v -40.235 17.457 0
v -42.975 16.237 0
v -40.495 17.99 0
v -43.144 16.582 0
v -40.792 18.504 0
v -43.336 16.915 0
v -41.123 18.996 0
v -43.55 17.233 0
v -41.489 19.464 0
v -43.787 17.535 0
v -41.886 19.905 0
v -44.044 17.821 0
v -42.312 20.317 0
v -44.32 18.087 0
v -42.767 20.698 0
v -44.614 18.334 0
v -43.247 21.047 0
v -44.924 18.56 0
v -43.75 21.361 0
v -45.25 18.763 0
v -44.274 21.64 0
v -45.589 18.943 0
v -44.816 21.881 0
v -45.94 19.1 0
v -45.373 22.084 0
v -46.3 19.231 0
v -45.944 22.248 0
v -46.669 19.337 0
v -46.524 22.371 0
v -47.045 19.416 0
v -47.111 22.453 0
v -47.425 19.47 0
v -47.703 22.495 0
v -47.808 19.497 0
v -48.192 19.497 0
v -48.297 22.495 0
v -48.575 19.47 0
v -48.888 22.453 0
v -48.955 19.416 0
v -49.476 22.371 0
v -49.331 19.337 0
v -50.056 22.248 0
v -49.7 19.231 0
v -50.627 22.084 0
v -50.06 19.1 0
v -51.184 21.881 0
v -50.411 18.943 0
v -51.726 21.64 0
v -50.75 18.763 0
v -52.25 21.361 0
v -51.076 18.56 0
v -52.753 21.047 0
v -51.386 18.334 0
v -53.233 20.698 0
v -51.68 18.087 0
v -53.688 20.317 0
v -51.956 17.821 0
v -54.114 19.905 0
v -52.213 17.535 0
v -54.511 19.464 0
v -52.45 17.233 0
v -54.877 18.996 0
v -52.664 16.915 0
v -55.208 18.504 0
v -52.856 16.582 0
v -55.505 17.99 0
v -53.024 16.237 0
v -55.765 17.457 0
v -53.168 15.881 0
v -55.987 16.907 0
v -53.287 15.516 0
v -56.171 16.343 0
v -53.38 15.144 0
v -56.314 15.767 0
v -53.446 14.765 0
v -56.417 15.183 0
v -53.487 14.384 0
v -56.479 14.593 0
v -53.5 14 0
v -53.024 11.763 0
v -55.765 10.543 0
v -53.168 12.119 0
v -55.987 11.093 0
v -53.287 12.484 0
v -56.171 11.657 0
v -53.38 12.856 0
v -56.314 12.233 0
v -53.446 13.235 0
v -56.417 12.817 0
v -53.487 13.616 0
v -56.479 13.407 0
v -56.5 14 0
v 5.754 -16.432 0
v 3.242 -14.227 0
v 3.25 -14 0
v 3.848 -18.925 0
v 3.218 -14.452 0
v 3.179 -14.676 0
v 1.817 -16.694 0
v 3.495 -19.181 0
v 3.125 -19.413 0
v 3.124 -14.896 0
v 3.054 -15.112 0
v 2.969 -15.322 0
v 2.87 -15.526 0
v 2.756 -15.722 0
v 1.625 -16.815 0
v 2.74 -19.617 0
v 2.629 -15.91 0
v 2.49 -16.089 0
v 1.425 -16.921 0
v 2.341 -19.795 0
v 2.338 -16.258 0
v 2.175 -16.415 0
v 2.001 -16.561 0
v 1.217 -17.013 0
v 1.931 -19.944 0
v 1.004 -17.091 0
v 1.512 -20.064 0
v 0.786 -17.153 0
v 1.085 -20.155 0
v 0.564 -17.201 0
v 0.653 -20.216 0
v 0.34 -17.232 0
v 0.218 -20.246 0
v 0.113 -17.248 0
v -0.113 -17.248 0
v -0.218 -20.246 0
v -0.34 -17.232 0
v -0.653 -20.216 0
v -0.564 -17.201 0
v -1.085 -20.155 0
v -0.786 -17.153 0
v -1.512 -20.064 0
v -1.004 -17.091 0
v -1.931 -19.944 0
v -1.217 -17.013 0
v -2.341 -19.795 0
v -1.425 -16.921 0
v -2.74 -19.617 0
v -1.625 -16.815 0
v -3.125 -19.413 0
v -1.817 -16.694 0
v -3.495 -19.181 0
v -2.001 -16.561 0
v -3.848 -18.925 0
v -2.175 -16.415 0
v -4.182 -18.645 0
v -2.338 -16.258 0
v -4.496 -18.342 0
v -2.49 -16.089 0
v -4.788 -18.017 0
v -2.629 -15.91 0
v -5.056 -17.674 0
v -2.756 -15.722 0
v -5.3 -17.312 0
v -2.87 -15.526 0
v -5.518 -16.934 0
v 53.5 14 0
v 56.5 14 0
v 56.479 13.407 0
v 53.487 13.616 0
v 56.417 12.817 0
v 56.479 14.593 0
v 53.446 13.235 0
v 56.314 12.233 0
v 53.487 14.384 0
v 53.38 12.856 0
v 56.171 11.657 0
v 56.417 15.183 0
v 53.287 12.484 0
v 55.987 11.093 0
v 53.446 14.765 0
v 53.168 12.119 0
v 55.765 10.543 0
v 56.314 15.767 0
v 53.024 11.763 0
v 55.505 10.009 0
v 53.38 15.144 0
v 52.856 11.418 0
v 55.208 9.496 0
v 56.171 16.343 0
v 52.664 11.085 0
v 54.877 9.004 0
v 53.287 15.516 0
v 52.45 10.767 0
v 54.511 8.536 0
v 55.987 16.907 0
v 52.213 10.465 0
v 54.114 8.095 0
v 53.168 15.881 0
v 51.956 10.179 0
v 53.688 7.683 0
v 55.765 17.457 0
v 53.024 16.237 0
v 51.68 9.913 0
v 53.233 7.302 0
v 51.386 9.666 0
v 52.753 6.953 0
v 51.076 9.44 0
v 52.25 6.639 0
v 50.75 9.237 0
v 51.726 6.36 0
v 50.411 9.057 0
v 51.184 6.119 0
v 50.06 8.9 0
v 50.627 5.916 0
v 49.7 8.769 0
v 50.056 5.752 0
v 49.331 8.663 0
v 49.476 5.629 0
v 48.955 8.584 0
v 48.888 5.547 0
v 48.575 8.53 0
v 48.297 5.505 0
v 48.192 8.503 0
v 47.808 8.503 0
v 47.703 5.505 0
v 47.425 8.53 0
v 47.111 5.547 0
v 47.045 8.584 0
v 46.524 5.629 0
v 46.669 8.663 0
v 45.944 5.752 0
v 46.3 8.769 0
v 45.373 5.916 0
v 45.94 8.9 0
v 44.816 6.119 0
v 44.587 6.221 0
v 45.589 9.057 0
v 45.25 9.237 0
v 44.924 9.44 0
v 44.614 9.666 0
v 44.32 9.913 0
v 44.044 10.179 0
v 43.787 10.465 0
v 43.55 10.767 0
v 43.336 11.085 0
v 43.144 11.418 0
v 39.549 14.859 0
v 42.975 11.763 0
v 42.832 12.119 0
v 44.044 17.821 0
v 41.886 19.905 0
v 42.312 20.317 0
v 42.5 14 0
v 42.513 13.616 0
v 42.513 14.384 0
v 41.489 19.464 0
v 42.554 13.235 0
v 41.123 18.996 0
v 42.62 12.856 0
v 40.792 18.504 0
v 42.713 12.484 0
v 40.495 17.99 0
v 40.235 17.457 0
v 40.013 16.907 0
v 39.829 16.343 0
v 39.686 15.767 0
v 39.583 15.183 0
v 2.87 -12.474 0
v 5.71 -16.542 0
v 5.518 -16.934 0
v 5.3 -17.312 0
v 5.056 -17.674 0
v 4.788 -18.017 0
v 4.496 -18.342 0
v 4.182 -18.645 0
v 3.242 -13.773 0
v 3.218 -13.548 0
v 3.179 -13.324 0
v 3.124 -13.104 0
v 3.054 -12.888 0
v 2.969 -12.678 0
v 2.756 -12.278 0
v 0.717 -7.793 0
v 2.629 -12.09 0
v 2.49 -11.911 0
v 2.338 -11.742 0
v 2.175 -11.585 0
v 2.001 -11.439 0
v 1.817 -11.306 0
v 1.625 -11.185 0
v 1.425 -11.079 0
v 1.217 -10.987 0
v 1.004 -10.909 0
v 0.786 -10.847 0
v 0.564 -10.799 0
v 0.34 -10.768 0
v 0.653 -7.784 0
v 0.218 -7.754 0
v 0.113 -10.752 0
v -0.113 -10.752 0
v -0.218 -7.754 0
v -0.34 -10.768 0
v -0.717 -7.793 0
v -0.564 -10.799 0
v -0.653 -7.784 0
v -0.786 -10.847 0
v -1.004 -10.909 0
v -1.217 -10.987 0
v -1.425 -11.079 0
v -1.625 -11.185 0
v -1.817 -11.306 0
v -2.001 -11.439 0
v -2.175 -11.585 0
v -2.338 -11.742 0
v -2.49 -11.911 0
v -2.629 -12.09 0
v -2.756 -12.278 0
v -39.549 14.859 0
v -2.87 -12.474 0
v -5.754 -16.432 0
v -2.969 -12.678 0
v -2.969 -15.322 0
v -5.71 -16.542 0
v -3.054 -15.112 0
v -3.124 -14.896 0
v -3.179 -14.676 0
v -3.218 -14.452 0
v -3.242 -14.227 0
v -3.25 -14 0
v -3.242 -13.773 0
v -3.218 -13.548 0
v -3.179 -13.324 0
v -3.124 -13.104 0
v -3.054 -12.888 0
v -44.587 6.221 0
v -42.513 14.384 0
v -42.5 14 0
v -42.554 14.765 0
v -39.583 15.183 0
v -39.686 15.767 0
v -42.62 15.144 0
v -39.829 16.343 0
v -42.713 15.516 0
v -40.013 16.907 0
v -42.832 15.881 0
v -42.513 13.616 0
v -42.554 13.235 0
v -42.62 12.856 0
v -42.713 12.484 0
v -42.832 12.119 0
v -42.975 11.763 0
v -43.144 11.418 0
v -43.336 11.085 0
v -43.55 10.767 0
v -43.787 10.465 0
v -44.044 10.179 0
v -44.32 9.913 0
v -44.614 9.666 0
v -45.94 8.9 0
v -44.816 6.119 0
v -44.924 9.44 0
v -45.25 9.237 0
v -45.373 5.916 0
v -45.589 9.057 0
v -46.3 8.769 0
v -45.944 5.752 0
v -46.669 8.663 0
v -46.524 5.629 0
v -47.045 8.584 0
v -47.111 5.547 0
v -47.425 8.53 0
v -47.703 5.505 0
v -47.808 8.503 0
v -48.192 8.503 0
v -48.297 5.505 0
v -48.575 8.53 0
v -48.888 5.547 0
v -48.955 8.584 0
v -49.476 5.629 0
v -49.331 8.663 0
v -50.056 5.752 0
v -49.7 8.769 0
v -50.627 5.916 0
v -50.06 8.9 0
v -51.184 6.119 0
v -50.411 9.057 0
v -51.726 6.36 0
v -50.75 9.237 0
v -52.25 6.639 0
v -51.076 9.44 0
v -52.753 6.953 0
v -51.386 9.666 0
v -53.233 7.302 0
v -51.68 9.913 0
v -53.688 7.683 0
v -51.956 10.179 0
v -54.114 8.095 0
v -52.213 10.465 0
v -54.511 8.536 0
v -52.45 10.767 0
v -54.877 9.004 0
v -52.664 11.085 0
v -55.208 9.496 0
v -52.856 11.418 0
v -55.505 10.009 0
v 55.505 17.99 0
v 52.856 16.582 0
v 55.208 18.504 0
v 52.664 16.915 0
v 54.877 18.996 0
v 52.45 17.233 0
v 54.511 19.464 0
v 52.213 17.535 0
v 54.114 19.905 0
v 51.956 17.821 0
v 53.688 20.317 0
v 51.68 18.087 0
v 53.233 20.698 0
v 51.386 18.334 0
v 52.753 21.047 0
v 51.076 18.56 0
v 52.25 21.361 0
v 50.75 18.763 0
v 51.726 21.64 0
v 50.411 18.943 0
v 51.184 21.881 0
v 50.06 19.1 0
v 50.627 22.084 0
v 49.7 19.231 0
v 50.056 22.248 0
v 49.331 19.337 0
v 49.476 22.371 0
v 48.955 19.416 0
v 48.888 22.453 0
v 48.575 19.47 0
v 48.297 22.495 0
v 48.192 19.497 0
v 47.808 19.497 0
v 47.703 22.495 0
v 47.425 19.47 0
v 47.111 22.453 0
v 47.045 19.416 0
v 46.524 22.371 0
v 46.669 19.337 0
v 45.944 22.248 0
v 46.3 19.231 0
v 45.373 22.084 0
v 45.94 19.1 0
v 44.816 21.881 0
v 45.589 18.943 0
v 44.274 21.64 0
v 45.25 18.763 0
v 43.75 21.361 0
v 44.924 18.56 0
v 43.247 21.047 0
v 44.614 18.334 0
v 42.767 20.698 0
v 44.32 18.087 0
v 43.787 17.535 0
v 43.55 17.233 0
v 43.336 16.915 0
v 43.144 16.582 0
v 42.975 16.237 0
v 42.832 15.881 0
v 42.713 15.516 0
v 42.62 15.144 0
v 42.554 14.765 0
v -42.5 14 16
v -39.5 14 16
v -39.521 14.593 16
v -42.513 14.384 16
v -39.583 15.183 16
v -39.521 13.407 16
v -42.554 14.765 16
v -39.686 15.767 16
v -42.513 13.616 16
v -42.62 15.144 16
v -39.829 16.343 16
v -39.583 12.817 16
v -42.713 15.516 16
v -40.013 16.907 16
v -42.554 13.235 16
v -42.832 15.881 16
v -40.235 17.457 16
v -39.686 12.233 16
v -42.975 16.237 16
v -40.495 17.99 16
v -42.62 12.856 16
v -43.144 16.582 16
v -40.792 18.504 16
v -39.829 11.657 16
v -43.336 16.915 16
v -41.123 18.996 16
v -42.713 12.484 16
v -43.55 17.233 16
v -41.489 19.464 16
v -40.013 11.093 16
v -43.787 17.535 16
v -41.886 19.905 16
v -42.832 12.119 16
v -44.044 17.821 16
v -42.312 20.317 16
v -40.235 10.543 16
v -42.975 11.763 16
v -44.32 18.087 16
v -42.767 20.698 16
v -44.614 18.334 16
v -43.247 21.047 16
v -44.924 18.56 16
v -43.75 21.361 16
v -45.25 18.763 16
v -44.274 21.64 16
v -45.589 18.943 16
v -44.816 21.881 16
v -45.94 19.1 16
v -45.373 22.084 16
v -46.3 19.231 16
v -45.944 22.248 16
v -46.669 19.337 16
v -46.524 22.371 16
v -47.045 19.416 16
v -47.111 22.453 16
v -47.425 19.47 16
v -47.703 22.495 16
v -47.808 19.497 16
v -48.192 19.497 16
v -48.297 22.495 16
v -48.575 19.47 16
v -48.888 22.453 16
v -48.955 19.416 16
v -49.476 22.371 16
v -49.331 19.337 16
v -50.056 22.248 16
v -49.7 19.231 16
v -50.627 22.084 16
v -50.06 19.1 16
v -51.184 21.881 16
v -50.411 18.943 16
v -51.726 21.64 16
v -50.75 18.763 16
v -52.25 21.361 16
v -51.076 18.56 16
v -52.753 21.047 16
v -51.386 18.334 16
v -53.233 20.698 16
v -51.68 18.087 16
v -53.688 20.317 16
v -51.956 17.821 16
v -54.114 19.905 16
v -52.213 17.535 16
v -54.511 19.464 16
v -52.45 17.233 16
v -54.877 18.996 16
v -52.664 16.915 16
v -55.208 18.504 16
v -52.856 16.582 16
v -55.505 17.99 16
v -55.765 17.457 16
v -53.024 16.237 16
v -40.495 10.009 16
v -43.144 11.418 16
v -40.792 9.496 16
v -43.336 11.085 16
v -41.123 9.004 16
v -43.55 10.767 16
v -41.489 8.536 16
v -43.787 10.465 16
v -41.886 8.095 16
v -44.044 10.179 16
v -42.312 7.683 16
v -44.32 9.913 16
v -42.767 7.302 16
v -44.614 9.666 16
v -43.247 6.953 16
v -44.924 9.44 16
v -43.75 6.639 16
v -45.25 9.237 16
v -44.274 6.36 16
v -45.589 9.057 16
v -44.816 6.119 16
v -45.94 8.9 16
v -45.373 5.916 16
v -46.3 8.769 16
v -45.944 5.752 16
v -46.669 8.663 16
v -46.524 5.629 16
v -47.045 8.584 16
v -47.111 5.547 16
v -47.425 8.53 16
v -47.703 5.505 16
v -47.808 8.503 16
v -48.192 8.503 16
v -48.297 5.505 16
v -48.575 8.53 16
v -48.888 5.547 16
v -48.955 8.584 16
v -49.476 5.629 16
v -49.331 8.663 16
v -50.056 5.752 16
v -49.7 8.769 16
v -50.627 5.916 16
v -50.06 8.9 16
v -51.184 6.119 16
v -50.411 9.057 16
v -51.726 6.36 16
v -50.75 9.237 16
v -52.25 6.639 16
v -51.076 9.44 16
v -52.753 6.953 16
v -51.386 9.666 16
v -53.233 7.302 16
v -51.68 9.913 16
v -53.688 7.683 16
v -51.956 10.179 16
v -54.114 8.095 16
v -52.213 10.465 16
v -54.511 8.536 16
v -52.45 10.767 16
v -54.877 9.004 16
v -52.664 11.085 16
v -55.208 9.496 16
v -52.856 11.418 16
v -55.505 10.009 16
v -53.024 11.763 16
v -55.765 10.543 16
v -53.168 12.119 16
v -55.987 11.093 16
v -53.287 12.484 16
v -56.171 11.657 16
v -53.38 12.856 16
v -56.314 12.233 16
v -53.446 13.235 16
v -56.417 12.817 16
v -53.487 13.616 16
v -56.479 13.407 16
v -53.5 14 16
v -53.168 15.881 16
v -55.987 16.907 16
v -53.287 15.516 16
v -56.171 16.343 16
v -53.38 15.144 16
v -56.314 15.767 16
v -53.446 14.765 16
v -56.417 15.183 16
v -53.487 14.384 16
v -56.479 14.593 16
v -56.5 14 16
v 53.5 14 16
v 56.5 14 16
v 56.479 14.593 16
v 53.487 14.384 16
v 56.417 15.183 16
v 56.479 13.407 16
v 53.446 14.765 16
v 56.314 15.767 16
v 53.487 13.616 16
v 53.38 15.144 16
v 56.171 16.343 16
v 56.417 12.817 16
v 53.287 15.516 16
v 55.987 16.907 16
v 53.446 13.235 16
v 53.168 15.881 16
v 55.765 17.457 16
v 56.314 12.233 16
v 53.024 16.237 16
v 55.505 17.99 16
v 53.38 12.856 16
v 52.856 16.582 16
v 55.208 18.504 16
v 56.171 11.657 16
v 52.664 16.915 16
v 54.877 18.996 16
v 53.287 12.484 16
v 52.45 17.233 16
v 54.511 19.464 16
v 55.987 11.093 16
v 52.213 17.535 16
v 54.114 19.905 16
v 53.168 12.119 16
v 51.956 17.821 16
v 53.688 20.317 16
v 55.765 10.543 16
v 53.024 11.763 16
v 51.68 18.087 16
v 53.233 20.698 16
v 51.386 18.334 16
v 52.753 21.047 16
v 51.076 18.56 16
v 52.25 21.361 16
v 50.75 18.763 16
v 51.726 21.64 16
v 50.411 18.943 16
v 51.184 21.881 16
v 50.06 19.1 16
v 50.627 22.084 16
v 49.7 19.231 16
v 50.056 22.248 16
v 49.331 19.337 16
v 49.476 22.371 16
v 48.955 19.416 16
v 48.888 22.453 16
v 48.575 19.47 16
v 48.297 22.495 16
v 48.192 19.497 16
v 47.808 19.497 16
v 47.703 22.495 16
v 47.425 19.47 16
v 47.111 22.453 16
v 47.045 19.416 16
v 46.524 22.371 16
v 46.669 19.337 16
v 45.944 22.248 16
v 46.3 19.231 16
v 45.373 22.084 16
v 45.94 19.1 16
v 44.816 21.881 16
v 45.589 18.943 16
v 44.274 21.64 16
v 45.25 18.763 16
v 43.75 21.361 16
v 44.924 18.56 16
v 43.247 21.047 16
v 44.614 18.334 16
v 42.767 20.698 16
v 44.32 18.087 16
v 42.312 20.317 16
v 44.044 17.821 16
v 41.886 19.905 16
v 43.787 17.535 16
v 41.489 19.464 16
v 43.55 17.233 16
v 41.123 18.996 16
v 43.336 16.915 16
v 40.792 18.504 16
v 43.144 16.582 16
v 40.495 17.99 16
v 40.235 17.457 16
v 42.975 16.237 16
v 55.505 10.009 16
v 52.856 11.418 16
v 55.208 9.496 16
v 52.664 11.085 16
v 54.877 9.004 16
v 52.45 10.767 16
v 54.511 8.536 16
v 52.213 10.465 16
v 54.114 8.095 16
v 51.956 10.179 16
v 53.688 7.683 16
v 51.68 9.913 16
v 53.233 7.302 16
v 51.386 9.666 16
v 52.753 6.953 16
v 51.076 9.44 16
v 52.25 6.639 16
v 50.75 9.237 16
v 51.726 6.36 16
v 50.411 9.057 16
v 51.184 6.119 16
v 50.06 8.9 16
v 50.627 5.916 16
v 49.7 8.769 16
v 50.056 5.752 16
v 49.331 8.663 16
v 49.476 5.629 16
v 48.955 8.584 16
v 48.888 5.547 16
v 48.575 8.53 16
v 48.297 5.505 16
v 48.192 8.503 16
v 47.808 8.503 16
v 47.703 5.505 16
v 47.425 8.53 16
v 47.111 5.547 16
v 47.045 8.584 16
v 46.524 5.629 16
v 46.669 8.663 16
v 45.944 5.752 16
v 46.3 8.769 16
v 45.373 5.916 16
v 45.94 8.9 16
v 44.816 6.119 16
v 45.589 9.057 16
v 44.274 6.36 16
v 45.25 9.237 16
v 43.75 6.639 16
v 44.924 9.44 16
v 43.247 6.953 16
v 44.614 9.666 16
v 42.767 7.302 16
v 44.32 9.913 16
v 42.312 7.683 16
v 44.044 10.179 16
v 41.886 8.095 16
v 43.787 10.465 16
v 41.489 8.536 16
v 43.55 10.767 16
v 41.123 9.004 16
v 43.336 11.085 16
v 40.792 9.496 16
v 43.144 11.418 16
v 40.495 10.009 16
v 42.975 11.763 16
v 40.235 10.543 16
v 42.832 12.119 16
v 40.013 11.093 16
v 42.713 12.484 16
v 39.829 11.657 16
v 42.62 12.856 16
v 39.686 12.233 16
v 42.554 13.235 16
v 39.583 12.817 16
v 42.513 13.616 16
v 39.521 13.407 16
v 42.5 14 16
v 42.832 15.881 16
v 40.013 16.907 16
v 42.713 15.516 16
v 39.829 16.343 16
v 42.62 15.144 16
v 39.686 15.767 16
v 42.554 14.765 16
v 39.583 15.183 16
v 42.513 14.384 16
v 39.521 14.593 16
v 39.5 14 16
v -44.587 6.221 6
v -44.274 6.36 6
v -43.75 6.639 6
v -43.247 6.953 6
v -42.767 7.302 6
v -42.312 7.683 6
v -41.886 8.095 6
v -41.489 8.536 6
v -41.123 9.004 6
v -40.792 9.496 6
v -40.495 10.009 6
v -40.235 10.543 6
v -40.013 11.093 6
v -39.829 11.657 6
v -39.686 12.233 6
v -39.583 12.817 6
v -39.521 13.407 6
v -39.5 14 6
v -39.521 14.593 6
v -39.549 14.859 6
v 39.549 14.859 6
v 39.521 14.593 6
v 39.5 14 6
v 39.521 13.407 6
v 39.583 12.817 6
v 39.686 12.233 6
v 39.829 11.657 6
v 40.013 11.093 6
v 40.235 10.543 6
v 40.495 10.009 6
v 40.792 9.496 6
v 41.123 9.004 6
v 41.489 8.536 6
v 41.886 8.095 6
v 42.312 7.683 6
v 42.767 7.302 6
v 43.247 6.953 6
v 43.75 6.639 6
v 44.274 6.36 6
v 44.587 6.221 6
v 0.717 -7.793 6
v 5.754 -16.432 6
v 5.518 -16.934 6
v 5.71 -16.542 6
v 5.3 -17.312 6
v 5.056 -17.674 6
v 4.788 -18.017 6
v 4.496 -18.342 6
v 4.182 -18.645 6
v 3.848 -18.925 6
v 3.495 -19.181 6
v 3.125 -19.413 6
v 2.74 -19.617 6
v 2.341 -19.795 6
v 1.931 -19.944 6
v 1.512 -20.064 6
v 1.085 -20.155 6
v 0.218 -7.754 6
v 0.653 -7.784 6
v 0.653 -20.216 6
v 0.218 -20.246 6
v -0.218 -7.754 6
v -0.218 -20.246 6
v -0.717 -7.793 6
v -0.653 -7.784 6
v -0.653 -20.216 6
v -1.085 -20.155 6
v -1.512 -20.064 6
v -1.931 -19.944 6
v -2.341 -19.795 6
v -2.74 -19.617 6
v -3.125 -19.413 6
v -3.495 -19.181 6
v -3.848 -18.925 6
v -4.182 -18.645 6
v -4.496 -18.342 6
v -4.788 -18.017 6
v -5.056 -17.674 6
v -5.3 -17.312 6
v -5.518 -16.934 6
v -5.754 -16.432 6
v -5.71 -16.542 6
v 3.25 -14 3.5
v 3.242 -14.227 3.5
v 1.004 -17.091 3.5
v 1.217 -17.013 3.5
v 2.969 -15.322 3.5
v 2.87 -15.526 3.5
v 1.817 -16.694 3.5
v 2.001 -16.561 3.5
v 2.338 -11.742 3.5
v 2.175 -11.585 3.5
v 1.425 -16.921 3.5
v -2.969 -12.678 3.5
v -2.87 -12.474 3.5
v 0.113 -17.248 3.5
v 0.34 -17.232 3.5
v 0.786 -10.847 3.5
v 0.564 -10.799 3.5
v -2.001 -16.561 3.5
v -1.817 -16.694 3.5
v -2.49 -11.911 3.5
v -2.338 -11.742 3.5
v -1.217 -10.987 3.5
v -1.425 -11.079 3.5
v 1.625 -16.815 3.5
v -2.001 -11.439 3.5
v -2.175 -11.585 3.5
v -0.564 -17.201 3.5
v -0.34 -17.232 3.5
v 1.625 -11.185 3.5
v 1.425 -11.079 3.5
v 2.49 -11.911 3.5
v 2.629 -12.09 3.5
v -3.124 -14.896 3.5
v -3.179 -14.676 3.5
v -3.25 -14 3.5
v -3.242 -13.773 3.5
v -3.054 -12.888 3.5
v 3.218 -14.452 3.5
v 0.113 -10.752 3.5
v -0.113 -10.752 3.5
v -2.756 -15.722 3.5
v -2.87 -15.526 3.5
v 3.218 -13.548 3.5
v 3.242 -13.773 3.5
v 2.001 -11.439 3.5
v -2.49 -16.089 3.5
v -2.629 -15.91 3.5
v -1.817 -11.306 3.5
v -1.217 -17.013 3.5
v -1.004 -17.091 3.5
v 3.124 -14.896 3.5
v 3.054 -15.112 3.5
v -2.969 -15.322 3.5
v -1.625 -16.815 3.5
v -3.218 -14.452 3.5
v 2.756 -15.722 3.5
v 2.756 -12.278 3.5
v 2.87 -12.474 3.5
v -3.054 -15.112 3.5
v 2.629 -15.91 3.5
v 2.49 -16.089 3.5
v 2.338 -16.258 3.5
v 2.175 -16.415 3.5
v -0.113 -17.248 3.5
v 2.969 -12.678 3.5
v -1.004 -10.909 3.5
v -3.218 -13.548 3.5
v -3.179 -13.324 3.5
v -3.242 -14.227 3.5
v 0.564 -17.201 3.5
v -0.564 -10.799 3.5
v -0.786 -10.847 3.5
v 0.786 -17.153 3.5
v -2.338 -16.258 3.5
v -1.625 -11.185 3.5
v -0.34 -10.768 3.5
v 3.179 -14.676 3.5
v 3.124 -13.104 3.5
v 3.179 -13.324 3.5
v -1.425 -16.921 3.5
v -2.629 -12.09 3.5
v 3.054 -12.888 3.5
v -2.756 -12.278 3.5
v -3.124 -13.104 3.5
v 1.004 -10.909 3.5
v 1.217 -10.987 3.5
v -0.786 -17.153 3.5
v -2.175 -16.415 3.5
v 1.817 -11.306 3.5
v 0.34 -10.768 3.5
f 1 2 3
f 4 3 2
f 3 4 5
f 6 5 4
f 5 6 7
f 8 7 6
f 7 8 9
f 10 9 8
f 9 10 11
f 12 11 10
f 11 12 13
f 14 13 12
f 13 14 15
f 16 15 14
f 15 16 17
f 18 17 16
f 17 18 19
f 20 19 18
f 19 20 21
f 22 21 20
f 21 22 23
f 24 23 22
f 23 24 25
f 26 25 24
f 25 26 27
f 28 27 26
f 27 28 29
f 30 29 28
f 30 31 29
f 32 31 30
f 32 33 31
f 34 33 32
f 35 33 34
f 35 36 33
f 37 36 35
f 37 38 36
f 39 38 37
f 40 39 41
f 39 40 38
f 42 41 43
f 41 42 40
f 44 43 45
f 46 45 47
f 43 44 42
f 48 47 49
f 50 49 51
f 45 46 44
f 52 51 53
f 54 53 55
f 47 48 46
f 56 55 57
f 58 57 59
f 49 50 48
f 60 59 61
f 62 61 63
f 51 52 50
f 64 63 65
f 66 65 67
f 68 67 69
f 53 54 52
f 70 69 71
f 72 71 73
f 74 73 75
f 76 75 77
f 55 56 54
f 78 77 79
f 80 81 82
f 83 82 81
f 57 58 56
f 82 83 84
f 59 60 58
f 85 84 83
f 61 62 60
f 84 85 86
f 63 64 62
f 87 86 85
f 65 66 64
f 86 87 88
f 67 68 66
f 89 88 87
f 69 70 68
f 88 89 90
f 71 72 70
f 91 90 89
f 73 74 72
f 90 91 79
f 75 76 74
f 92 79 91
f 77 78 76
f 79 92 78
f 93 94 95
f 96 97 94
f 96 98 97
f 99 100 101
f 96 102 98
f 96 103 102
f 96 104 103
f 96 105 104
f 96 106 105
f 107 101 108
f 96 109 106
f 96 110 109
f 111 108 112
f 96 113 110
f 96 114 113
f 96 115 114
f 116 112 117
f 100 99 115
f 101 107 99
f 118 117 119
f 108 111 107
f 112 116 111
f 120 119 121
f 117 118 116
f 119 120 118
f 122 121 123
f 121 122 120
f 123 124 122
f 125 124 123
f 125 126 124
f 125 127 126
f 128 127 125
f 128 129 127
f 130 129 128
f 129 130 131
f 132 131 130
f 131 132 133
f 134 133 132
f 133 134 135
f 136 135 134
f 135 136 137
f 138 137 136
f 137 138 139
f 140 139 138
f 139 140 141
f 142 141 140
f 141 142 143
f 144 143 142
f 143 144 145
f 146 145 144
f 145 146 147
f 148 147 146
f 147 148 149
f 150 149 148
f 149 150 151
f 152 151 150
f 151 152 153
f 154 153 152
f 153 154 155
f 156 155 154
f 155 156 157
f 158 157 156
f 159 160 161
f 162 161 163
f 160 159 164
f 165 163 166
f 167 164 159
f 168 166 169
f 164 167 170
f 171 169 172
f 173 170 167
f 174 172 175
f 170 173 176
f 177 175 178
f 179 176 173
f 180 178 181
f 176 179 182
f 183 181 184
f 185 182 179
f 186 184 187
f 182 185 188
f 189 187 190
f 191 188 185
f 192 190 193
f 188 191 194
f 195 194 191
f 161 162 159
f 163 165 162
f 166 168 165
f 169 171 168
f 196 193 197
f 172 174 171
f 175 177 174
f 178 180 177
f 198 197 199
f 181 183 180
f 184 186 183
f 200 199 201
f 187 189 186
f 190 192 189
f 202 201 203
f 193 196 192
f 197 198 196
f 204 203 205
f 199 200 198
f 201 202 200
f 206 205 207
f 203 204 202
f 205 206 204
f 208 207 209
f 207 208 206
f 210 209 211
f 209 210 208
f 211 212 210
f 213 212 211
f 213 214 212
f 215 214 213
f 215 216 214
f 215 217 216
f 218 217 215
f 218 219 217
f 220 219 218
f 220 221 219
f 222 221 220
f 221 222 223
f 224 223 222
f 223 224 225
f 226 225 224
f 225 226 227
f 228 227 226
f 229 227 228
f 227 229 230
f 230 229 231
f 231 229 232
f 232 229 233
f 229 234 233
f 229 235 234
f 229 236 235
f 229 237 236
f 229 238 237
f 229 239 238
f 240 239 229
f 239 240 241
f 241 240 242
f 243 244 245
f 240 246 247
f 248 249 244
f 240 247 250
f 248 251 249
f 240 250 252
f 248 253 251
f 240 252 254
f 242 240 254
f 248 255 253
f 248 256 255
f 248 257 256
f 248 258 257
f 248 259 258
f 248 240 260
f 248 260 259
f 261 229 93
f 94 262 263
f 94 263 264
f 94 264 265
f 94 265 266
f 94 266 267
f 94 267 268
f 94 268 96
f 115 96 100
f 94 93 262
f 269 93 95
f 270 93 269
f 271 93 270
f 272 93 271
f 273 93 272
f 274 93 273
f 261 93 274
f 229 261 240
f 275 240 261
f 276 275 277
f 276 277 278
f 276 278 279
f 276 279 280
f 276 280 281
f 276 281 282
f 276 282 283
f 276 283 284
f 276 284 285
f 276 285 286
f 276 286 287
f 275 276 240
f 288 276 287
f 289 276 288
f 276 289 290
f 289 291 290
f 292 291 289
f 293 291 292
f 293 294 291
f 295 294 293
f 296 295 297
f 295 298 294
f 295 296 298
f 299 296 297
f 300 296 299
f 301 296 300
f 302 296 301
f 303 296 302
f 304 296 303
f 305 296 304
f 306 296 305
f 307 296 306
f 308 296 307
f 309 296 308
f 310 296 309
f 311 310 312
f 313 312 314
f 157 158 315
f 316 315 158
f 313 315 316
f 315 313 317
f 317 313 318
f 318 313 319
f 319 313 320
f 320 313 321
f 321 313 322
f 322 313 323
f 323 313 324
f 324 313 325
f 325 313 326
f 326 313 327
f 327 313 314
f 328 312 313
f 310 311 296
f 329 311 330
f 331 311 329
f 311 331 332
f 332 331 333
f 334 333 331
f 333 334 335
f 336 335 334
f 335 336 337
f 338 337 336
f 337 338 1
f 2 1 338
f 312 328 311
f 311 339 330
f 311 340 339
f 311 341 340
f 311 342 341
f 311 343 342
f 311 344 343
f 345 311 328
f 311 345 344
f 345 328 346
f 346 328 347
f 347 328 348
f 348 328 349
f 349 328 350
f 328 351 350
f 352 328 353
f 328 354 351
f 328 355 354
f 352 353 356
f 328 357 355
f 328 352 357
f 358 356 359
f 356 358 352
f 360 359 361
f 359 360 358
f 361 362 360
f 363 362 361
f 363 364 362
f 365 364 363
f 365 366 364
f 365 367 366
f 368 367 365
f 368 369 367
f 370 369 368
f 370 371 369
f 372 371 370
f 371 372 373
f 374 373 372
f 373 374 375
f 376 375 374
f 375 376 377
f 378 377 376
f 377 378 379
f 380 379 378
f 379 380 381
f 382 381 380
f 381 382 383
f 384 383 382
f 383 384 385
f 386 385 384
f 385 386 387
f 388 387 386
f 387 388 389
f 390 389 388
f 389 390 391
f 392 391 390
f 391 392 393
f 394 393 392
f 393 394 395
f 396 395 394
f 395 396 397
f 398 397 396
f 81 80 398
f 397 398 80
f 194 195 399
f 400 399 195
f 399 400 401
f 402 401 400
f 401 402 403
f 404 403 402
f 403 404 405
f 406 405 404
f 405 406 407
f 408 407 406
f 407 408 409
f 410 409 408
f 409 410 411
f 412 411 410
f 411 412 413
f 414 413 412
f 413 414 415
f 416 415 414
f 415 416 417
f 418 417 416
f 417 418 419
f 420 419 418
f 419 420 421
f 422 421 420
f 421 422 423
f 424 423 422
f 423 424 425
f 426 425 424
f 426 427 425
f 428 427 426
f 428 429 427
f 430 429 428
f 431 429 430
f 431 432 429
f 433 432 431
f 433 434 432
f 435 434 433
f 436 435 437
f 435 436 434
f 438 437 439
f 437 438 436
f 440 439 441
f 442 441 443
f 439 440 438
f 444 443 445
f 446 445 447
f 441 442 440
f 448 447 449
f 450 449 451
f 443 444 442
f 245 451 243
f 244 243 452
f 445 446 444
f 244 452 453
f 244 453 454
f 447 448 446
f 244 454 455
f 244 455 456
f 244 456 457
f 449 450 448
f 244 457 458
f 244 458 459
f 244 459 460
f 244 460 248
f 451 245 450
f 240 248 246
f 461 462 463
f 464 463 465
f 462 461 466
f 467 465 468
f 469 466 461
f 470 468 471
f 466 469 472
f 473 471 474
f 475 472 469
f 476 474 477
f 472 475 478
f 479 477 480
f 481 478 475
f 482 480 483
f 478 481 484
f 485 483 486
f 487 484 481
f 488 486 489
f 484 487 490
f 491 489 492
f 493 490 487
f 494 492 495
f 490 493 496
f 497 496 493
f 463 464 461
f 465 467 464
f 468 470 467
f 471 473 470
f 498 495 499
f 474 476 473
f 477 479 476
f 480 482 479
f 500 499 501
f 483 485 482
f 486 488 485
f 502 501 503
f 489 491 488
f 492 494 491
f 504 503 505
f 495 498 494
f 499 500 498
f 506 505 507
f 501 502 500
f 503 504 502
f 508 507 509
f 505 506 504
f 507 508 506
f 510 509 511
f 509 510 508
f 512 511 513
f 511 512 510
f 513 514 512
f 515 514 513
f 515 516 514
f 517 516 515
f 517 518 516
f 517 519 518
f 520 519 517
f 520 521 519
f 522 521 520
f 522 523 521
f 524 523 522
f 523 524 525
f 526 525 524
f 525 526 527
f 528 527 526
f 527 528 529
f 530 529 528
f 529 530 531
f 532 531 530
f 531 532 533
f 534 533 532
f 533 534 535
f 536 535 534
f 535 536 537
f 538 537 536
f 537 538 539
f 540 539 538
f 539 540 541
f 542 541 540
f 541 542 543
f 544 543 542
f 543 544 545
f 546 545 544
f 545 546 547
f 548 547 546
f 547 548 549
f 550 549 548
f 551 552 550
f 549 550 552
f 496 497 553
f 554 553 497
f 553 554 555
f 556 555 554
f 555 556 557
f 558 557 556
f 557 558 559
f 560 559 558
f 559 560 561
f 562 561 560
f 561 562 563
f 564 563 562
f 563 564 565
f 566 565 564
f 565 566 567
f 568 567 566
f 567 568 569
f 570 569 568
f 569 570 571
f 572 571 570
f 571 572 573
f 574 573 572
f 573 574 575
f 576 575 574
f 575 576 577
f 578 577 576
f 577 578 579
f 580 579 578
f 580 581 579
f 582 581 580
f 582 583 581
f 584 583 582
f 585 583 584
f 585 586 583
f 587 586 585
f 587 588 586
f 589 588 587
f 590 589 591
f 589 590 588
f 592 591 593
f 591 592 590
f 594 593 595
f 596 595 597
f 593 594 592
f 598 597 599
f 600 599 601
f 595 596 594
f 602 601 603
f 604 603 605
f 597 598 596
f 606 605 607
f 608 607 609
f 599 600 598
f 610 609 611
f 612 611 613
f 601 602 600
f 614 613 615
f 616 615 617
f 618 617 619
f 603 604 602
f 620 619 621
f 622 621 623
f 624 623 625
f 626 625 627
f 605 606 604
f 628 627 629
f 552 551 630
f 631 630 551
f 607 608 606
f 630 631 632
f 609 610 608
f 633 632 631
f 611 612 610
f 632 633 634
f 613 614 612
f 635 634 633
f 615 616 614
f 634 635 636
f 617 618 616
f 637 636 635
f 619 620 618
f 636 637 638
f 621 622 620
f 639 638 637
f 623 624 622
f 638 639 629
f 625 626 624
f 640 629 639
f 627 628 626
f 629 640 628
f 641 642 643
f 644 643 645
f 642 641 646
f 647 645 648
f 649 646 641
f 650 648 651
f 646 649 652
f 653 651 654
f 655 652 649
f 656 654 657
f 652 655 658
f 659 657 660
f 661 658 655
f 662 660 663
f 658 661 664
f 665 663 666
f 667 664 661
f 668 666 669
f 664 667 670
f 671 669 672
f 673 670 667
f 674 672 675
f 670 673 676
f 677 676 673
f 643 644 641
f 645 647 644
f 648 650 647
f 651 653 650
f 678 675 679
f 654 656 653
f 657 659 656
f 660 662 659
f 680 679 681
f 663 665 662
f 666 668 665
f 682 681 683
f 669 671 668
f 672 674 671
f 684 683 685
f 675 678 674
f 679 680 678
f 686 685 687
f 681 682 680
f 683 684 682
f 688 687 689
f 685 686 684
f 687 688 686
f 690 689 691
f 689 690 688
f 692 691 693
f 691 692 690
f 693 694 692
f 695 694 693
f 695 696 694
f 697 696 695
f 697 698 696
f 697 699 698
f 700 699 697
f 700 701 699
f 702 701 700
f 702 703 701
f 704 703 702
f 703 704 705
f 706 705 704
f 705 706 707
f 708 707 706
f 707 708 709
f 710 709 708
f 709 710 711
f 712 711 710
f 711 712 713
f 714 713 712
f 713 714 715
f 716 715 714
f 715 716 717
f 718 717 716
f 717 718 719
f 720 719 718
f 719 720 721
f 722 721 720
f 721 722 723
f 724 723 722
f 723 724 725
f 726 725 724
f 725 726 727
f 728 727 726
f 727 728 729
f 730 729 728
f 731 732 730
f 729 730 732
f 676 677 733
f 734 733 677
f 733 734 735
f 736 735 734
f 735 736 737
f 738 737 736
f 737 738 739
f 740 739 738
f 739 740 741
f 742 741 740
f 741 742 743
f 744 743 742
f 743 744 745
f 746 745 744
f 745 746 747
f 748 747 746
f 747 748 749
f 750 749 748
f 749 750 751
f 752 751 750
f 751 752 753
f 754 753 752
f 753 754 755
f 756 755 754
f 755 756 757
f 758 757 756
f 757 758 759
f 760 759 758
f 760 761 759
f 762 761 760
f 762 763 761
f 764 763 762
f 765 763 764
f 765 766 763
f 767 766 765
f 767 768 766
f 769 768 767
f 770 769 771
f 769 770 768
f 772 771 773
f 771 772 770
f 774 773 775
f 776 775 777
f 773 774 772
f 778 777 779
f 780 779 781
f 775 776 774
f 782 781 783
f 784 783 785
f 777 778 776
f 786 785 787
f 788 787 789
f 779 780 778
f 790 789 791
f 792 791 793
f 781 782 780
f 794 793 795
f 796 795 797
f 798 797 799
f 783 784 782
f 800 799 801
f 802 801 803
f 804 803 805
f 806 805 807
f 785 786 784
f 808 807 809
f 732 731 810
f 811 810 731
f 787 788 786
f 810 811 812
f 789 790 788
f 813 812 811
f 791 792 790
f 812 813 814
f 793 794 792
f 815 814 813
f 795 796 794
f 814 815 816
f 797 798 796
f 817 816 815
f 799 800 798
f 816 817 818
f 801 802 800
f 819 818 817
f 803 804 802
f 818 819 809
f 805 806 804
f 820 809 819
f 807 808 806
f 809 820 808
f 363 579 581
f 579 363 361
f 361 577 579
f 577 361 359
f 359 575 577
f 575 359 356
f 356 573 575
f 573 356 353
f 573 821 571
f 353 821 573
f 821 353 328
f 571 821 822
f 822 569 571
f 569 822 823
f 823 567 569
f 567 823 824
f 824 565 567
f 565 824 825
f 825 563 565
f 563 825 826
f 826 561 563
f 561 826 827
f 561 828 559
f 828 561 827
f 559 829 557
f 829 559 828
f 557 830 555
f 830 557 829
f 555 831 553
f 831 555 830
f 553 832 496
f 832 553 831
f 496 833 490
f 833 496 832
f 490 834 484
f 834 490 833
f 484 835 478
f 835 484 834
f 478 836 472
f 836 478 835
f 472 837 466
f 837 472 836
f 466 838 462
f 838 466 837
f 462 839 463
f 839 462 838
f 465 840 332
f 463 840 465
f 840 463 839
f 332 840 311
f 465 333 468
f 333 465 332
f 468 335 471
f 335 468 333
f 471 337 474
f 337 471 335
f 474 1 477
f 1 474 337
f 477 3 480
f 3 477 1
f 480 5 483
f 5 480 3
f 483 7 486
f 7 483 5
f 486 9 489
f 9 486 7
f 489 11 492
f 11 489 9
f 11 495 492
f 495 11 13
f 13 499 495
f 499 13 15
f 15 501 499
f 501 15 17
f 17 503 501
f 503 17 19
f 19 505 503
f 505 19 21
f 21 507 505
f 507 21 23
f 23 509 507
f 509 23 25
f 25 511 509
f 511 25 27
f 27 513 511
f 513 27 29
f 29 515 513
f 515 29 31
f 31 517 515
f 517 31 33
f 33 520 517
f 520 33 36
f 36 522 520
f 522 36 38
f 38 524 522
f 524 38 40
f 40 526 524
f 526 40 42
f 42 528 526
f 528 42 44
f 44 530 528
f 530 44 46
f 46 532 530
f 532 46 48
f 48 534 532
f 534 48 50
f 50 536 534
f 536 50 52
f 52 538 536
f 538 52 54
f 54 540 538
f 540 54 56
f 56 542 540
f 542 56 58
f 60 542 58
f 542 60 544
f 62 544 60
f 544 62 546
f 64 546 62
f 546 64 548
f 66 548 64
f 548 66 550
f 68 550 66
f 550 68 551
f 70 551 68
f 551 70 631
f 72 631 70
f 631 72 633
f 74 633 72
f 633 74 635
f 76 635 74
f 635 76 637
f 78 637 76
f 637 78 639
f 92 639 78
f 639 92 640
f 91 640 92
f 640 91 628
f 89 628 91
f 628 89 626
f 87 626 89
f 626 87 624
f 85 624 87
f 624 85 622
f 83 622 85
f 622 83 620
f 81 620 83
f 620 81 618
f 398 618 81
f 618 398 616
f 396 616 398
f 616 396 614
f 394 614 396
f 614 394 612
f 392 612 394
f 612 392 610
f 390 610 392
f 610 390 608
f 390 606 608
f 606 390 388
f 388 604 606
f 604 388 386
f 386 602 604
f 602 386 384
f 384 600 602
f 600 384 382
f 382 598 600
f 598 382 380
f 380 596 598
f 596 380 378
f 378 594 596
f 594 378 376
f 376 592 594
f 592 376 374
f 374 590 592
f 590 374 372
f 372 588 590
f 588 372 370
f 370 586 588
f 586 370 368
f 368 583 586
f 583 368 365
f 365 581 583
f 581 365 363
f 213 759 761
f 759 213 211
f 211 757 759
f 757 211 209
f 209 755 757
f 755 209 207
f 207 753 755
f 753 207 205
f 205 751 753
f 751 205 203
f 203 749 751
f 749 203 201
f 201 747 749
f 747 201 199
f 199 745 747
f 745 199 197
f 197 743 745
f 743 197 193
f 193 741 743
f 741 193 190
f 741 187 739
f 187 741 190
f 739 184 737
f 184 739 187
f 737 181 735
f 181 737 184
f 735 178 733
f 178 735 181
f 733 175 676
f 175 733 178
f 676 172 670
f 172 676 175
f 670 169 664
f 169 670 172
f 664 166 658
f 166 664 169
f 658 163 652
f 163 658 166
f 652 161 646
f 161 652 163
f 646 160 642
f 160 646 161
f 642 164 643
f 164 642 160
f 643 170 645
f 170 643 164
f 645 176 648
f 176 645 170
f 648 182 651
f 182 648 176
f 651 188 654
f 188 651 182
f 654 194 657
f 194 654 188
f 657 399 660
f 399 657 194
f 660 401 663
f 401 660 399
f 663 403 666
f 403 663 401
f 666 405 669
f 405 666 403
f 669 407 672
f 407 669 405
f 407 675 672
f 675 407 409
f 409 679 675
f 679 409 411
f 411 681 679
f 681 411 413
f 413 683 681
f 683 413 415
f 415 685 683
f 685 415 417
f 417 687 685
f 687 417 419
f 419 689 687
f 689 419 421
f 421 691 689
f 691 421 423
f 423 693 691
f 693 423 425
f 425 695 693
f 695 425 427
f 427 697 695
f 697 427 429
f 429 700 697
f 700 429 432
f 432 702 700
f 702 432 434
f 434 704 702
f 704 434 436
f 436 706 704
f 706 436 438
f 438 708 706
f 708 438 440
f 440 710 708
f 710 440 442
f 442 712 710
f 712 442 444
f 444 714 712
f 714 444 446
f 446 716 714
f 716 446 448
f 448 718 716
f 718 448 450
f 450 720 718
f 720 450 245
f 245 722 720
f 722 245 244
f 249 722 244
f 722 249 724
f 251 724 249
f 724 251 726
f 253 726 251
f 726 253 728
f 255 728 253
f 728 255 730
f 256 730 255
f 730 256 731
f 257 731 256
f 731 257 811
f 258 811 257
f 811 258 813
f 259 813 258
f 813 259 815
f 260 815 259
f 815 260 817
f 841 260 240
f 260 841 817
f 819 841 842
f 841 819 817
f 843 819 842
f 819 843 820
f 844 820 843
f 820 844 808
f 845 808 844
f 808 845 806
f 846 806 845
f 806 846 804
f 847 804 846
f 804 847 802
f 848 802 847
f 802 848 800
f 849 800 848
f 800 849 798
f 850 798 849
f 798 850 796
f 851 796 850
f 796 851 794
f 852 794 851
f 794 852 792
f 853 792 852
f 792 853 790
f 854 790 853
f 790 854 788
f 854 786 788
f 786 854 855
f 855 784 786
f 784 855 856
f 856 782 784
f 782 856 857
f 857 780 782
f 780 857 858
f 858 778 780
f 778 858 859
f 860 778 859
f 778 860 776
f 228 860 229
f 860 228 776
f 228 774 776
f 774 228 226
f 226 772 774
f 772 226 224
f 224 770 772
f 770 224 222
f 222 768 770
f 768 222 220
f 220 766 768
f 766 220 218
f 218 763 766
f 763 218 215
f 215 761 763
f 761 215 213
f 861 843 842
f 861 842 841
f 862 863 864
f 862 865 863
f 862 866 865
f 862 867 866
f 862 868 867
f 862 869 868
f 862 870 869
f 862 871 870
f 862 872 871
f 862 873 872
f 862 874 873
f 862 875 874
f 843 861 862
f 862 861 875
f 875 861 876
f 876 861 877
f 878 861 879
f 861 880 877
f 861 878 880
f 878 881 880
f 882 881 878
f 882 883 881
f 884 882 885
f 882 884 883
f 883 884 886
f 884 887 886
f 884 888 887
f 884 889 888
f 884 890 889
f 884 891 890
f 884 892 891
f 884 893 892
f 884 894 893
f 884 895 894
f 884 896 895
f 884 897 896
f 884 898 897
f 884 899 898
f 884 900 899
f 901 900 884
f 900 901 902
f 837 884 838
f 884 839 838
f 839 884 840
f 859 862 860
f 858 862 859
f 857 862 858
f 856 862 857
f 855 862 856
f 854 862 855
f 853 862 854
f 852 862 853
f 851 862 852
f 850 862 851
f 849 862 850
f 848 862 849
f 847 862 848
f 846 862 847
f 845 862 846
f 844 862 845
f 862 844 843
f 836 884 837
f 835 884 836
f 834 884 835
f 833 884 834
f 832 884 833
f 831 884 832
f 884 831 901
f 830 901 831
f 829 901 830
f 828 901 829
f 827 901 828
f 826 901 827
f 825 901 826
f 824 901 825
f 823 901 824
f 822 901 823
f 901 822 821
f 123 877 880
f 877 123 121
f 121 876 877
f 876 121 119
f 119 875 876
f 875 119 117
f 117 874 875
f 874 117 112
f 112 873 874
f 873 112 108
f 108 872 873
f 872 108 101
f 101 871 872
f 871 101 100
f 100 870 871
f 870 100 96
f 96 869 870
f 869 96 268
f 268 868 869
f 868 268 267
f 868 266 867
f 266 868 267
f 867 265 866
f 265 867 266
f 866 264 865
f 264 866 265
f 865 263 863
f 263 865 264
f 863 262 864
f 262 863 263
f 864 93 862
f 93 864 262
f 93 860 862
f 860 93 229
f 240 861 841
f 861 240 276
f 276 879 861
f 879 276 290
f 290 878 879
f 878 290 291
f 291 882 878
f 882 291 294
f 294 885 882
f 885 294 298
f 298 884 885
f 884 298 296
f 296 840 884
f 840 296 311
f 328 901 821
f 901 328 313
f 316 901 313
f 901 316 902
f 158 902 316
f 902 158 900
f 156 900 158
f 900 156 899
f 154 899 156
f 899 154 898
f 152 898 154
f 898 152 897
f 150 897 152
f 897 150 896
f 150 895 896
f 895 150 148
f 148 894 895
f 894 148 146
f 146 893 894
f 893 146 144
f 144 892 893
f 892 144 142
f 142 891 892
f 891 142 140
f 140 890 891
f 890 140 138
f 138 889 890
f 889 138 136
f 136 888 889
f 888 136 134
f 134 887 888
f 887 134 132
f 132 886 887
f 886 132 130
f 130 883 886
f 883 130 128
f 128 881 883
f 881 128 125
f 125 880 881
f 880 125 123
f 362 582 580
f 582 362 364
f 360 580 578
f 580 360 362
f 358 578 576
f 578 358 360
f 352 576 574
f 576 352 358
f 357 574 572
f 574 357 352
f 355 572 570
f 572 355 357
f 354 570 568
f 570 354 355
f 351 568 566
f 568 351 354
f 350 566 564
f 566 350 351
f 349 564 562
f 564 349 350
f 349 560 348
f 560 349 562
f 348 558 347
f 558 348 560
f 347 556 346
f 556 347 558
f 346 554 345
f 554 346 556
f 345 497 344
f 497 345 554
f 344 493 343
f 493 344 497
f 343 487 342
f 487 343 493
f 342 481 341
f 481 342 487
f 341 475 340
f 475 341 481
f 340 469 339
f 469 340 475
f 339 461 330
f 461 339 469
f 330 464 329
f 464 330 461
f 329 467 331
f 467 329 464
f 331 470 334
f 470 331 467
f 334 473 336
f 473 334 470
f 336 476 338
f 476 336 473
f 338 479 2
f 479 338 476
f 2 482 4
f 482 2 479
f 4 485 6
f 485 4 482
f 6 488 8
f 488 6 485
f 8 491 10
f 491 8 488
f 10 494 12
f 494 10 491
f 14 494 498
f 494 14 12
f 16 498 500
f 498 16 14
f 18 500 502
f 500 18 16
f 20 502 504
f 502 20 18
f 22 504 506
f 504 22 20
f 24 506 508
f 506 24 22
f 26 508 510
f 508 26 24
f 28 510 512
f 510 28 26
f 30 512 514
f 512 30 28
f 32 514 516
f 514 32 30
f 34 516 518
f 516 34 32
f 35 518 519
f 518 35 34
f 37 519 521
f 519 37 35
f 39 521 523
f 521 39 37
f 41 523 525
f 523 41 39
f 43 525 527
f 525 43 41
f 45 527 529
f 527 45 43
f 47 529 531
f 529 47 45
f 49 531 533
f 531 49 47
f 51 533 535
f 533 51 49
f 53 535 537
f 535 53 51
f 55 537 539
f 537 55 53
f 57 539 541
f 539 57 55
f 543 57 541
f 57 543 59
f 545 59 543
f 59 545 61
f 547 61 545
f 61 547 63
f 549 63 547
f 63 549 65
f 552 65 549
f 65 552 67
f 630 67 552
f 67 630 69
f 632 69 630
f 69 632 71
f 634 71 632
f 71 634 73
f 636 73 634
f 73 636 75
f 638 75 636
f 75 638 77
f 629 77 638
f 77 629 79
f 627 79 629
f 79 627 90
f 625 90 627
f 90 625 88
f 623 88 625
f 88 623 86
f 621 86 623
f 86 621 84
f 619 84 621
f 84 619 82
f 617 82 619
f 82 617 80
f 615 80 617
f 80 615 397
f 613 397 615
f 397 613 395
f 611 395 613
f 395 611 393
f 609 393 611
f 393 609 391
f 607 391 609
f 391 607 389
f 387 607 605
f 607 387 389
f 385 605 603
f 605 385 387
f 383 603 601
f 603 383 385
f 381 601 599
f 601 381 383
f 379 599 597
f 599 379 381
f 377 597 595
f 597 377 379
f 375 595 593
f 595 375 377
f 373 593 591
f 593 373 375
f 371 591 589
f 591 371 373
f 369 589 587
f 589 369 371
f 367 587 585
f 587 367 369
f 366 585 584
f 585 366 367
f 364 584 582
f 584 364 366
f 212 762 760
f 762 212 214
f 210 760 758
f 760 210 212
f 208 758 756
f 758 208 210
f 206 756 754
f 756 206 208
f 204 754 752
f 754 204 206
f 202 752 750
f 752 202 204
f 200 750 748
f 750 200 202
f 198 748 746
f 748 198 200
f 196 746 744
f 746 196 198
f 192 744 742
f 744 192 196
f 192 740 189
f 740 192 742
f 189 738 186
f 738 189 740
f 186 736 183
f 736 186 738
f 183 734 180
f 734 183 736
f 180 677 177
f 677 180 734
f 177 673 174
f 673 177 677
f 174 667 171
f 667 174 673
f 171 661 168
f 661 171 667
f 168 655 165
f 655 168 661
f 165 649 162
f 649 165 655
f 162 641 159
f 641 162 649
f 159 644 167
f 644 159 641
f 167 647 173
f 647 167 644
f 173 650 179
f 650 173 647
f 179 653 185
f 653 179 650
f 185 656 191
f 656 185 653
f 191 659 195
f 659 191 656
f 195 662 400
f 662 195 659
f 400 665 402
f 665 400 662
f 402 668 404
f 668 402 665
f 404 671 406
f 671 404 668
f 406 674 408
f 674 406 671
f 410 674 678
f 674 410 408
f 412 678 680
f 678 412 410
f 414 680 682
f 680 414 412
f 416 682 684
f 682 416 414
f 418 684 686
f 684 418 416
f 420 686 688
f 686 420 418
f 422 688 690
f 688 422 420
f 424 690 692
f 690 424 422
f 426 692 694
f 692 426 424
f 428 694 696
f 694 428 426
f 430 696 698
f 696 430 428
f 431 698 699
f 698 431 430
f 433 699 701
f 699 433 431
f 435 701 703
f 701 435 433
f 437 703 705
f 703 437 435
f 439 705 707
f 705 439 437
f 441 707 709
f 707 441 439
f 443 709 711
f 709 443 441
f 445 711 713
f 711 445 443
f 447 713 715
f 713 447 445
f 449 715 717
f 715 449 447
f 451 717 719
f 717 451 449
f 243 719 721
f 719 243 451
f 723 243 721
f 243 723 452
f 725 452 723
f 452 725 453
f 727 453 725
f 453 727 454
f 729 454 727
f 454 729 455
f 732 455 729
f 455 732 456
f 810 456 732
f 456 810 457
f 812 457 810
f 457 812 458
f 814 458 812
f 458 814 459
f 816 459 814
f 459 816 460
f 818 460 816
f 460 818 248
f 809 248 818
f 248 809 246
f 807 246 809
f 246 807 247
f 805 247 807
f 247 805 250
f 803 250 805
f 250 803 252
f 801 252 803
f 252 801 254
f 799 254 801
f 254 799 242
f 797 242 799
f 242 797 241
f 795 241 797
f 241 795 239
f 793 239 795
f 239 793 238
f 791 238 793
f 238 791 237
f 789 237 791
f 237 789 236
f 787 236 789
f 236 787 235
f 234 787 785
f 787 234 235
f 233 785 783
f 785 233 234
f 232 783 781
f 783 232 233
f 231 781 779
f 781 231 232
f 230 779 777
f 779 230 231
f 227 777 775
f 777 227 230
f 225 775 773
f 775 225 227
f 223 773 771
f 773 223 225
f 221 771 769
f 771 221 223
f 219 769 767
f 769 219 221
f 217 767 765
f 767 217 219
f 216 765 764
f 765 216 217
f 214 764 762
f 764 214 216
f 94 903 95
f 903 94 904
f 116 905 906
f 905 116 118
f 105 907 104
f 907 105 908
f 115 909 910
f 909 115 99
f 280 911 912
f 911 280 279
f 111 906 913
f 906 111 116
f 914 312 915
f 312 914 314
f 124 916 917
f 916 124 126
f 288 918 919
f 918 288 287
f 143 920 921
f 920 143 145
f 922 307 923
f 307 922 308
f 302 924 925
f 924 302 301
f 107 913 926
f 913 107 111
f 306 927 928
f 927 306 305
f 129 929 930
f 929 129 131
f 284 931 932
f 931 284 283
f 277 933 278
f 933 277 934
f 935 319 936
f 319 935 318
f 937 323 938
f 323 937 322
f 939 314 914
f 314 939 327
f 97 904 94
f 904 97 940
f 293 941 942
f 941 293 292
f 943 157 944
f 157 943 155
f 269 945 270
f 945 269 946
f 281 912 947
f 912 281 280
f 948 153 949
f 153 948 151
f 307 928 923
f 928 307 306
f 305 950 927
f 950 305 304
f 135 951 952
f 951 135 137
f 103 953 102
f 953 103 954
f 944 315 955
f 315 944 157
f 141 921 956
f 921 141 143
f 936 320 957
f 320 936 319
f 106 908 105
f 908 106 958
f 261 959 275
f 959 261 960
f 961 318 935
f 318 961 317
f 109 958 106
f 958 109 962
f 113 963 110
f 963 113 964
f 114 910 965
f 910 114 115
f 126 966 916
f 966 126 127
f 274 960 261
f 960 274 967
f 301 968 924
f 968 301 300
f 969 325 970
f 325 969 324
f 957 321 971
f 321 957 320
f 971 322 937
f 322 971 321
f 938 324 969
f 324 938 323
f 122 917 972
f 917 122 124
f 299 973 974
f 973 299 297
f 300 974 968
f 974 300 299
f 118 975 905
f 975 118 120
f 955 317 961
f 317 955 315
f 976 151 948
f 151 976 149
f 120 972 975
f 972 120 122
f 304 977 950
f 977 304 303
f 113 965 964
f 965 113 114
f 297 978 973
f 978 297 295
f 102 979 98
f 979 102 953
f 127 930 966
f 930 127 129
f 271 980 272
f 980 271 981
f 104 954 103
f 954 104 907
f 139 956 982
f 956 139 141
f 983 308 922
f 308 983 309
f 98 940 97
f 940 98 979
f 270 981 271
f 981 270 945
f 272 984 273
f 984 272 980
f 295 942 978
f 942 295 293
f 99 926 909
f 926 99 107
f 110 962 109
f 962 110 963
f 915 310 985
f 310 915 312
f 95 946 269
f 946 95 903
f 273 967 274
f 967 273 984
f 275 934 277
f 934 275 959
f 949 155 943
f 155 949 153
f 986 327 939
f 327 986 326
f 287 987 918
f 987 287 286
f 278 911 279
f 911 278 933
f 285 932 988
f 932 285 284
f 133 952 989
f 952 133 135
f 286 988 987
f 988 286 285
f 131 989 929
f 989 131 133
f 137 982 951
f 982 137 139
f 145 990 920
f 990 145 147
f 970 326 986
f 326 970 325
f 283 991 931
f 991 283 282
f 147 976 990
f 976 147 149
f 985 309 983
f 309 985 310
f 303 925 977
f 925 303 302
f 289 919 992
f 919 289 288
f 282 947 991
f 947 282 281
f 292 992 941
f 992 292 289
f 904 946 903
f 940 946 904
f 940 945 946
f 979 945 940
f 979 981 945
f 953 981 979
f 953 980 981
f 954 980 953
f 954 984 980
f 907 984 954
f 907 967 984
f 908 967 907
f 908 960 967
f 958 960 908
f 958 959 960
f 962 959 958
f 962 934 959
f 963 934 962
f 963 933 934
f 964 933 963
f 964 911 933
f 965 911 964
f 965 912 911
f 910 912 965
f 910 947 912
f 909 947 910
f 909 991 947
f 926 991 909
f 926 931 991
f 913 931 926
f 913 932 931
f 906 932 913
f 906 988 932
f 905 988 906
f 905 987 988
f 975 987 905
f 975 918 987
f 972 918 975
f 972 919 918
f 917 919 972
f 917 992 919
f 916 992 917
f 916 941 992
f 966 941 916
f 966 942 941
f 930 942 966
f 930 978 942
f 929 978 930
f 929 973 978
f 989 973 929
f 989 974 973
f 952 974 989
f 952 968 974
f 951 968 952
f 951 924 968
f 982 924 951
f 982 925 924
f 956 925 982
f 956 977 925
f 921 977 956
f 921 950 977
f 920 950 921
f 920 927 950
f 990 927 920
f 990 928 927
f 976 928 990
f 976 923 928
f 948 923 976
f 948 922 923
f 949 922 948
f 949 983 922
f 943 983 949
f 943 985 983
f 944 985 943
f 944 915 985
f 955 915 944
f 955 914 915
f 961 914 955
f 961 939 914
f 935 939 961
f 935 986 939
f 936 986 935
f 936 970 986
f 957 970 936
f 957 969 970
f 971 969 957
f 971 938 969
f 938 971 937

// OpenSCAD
// measured
distanceBetweenCenters = 96;
rodDiameter = 11; // 10mm measured
magnetDiameter = 6.5; // 6mm measured / spec'd
magnetDepth = 3.5; // 3mm measured

// measured-ish
distanceToFrame = 28;

// dictated
holderWidth = 3;
armWidth = 10;
holderDepth = 6;
handleGrab = 16;

// tweaks
$fn = 90;

angle = atan2( -distanceToFrame, distanceBetweenCenters / 2);
armLength = sqrt(pow(distanceToFrame,2)+pow(distanceBetweenCenters / 2,2));
grabWidth = rodDiameter + holderWidth*2;

difference () {
  union () {
    linear_extrude(handleGrab) {
      translate([-distanceBetweenCenters/2,distanceToFrame/2,0]) circle(d=grabWidth);
      translate([distanceBetweenCenters/2,distanceToFrame/2,0]) circle(d=grabWidth);
    }
    linear_extrude(holderDepth) {
      translate([-distanceBetweenCenters/2,distanceToFrame/2,0])
        rotate([0,0,angle]) translate([0,-armWidth/2,0])
        square([armLength, armWidth]);
      translate([distanceBetweenCenters/2,distanceToFrame/2,0])
        rotate([0,0,180-angle]) translate([0,-armWidth/2,0])
        square([armLength, armWidth]);
      translate([0,-distanceToFrame/2,0]) circle(d=magnetDiameter + holderWidth*2);
    }
  }
  linear_extrude(handleGrab) {
    translate([-distanceBetweenCenters/2,distanceToFrame/2,0])
      circle(d=rodDiameter);
    translate([distanceBetweenCenters/2,distanceToFrame/2,0])
      circle(d=rodDiameter);
  }
  linear_extrude(magnetDepth) {
    translate([0,-distanceToFrame/2,0])
      circle(d=magnetDiameter);
  }
}
